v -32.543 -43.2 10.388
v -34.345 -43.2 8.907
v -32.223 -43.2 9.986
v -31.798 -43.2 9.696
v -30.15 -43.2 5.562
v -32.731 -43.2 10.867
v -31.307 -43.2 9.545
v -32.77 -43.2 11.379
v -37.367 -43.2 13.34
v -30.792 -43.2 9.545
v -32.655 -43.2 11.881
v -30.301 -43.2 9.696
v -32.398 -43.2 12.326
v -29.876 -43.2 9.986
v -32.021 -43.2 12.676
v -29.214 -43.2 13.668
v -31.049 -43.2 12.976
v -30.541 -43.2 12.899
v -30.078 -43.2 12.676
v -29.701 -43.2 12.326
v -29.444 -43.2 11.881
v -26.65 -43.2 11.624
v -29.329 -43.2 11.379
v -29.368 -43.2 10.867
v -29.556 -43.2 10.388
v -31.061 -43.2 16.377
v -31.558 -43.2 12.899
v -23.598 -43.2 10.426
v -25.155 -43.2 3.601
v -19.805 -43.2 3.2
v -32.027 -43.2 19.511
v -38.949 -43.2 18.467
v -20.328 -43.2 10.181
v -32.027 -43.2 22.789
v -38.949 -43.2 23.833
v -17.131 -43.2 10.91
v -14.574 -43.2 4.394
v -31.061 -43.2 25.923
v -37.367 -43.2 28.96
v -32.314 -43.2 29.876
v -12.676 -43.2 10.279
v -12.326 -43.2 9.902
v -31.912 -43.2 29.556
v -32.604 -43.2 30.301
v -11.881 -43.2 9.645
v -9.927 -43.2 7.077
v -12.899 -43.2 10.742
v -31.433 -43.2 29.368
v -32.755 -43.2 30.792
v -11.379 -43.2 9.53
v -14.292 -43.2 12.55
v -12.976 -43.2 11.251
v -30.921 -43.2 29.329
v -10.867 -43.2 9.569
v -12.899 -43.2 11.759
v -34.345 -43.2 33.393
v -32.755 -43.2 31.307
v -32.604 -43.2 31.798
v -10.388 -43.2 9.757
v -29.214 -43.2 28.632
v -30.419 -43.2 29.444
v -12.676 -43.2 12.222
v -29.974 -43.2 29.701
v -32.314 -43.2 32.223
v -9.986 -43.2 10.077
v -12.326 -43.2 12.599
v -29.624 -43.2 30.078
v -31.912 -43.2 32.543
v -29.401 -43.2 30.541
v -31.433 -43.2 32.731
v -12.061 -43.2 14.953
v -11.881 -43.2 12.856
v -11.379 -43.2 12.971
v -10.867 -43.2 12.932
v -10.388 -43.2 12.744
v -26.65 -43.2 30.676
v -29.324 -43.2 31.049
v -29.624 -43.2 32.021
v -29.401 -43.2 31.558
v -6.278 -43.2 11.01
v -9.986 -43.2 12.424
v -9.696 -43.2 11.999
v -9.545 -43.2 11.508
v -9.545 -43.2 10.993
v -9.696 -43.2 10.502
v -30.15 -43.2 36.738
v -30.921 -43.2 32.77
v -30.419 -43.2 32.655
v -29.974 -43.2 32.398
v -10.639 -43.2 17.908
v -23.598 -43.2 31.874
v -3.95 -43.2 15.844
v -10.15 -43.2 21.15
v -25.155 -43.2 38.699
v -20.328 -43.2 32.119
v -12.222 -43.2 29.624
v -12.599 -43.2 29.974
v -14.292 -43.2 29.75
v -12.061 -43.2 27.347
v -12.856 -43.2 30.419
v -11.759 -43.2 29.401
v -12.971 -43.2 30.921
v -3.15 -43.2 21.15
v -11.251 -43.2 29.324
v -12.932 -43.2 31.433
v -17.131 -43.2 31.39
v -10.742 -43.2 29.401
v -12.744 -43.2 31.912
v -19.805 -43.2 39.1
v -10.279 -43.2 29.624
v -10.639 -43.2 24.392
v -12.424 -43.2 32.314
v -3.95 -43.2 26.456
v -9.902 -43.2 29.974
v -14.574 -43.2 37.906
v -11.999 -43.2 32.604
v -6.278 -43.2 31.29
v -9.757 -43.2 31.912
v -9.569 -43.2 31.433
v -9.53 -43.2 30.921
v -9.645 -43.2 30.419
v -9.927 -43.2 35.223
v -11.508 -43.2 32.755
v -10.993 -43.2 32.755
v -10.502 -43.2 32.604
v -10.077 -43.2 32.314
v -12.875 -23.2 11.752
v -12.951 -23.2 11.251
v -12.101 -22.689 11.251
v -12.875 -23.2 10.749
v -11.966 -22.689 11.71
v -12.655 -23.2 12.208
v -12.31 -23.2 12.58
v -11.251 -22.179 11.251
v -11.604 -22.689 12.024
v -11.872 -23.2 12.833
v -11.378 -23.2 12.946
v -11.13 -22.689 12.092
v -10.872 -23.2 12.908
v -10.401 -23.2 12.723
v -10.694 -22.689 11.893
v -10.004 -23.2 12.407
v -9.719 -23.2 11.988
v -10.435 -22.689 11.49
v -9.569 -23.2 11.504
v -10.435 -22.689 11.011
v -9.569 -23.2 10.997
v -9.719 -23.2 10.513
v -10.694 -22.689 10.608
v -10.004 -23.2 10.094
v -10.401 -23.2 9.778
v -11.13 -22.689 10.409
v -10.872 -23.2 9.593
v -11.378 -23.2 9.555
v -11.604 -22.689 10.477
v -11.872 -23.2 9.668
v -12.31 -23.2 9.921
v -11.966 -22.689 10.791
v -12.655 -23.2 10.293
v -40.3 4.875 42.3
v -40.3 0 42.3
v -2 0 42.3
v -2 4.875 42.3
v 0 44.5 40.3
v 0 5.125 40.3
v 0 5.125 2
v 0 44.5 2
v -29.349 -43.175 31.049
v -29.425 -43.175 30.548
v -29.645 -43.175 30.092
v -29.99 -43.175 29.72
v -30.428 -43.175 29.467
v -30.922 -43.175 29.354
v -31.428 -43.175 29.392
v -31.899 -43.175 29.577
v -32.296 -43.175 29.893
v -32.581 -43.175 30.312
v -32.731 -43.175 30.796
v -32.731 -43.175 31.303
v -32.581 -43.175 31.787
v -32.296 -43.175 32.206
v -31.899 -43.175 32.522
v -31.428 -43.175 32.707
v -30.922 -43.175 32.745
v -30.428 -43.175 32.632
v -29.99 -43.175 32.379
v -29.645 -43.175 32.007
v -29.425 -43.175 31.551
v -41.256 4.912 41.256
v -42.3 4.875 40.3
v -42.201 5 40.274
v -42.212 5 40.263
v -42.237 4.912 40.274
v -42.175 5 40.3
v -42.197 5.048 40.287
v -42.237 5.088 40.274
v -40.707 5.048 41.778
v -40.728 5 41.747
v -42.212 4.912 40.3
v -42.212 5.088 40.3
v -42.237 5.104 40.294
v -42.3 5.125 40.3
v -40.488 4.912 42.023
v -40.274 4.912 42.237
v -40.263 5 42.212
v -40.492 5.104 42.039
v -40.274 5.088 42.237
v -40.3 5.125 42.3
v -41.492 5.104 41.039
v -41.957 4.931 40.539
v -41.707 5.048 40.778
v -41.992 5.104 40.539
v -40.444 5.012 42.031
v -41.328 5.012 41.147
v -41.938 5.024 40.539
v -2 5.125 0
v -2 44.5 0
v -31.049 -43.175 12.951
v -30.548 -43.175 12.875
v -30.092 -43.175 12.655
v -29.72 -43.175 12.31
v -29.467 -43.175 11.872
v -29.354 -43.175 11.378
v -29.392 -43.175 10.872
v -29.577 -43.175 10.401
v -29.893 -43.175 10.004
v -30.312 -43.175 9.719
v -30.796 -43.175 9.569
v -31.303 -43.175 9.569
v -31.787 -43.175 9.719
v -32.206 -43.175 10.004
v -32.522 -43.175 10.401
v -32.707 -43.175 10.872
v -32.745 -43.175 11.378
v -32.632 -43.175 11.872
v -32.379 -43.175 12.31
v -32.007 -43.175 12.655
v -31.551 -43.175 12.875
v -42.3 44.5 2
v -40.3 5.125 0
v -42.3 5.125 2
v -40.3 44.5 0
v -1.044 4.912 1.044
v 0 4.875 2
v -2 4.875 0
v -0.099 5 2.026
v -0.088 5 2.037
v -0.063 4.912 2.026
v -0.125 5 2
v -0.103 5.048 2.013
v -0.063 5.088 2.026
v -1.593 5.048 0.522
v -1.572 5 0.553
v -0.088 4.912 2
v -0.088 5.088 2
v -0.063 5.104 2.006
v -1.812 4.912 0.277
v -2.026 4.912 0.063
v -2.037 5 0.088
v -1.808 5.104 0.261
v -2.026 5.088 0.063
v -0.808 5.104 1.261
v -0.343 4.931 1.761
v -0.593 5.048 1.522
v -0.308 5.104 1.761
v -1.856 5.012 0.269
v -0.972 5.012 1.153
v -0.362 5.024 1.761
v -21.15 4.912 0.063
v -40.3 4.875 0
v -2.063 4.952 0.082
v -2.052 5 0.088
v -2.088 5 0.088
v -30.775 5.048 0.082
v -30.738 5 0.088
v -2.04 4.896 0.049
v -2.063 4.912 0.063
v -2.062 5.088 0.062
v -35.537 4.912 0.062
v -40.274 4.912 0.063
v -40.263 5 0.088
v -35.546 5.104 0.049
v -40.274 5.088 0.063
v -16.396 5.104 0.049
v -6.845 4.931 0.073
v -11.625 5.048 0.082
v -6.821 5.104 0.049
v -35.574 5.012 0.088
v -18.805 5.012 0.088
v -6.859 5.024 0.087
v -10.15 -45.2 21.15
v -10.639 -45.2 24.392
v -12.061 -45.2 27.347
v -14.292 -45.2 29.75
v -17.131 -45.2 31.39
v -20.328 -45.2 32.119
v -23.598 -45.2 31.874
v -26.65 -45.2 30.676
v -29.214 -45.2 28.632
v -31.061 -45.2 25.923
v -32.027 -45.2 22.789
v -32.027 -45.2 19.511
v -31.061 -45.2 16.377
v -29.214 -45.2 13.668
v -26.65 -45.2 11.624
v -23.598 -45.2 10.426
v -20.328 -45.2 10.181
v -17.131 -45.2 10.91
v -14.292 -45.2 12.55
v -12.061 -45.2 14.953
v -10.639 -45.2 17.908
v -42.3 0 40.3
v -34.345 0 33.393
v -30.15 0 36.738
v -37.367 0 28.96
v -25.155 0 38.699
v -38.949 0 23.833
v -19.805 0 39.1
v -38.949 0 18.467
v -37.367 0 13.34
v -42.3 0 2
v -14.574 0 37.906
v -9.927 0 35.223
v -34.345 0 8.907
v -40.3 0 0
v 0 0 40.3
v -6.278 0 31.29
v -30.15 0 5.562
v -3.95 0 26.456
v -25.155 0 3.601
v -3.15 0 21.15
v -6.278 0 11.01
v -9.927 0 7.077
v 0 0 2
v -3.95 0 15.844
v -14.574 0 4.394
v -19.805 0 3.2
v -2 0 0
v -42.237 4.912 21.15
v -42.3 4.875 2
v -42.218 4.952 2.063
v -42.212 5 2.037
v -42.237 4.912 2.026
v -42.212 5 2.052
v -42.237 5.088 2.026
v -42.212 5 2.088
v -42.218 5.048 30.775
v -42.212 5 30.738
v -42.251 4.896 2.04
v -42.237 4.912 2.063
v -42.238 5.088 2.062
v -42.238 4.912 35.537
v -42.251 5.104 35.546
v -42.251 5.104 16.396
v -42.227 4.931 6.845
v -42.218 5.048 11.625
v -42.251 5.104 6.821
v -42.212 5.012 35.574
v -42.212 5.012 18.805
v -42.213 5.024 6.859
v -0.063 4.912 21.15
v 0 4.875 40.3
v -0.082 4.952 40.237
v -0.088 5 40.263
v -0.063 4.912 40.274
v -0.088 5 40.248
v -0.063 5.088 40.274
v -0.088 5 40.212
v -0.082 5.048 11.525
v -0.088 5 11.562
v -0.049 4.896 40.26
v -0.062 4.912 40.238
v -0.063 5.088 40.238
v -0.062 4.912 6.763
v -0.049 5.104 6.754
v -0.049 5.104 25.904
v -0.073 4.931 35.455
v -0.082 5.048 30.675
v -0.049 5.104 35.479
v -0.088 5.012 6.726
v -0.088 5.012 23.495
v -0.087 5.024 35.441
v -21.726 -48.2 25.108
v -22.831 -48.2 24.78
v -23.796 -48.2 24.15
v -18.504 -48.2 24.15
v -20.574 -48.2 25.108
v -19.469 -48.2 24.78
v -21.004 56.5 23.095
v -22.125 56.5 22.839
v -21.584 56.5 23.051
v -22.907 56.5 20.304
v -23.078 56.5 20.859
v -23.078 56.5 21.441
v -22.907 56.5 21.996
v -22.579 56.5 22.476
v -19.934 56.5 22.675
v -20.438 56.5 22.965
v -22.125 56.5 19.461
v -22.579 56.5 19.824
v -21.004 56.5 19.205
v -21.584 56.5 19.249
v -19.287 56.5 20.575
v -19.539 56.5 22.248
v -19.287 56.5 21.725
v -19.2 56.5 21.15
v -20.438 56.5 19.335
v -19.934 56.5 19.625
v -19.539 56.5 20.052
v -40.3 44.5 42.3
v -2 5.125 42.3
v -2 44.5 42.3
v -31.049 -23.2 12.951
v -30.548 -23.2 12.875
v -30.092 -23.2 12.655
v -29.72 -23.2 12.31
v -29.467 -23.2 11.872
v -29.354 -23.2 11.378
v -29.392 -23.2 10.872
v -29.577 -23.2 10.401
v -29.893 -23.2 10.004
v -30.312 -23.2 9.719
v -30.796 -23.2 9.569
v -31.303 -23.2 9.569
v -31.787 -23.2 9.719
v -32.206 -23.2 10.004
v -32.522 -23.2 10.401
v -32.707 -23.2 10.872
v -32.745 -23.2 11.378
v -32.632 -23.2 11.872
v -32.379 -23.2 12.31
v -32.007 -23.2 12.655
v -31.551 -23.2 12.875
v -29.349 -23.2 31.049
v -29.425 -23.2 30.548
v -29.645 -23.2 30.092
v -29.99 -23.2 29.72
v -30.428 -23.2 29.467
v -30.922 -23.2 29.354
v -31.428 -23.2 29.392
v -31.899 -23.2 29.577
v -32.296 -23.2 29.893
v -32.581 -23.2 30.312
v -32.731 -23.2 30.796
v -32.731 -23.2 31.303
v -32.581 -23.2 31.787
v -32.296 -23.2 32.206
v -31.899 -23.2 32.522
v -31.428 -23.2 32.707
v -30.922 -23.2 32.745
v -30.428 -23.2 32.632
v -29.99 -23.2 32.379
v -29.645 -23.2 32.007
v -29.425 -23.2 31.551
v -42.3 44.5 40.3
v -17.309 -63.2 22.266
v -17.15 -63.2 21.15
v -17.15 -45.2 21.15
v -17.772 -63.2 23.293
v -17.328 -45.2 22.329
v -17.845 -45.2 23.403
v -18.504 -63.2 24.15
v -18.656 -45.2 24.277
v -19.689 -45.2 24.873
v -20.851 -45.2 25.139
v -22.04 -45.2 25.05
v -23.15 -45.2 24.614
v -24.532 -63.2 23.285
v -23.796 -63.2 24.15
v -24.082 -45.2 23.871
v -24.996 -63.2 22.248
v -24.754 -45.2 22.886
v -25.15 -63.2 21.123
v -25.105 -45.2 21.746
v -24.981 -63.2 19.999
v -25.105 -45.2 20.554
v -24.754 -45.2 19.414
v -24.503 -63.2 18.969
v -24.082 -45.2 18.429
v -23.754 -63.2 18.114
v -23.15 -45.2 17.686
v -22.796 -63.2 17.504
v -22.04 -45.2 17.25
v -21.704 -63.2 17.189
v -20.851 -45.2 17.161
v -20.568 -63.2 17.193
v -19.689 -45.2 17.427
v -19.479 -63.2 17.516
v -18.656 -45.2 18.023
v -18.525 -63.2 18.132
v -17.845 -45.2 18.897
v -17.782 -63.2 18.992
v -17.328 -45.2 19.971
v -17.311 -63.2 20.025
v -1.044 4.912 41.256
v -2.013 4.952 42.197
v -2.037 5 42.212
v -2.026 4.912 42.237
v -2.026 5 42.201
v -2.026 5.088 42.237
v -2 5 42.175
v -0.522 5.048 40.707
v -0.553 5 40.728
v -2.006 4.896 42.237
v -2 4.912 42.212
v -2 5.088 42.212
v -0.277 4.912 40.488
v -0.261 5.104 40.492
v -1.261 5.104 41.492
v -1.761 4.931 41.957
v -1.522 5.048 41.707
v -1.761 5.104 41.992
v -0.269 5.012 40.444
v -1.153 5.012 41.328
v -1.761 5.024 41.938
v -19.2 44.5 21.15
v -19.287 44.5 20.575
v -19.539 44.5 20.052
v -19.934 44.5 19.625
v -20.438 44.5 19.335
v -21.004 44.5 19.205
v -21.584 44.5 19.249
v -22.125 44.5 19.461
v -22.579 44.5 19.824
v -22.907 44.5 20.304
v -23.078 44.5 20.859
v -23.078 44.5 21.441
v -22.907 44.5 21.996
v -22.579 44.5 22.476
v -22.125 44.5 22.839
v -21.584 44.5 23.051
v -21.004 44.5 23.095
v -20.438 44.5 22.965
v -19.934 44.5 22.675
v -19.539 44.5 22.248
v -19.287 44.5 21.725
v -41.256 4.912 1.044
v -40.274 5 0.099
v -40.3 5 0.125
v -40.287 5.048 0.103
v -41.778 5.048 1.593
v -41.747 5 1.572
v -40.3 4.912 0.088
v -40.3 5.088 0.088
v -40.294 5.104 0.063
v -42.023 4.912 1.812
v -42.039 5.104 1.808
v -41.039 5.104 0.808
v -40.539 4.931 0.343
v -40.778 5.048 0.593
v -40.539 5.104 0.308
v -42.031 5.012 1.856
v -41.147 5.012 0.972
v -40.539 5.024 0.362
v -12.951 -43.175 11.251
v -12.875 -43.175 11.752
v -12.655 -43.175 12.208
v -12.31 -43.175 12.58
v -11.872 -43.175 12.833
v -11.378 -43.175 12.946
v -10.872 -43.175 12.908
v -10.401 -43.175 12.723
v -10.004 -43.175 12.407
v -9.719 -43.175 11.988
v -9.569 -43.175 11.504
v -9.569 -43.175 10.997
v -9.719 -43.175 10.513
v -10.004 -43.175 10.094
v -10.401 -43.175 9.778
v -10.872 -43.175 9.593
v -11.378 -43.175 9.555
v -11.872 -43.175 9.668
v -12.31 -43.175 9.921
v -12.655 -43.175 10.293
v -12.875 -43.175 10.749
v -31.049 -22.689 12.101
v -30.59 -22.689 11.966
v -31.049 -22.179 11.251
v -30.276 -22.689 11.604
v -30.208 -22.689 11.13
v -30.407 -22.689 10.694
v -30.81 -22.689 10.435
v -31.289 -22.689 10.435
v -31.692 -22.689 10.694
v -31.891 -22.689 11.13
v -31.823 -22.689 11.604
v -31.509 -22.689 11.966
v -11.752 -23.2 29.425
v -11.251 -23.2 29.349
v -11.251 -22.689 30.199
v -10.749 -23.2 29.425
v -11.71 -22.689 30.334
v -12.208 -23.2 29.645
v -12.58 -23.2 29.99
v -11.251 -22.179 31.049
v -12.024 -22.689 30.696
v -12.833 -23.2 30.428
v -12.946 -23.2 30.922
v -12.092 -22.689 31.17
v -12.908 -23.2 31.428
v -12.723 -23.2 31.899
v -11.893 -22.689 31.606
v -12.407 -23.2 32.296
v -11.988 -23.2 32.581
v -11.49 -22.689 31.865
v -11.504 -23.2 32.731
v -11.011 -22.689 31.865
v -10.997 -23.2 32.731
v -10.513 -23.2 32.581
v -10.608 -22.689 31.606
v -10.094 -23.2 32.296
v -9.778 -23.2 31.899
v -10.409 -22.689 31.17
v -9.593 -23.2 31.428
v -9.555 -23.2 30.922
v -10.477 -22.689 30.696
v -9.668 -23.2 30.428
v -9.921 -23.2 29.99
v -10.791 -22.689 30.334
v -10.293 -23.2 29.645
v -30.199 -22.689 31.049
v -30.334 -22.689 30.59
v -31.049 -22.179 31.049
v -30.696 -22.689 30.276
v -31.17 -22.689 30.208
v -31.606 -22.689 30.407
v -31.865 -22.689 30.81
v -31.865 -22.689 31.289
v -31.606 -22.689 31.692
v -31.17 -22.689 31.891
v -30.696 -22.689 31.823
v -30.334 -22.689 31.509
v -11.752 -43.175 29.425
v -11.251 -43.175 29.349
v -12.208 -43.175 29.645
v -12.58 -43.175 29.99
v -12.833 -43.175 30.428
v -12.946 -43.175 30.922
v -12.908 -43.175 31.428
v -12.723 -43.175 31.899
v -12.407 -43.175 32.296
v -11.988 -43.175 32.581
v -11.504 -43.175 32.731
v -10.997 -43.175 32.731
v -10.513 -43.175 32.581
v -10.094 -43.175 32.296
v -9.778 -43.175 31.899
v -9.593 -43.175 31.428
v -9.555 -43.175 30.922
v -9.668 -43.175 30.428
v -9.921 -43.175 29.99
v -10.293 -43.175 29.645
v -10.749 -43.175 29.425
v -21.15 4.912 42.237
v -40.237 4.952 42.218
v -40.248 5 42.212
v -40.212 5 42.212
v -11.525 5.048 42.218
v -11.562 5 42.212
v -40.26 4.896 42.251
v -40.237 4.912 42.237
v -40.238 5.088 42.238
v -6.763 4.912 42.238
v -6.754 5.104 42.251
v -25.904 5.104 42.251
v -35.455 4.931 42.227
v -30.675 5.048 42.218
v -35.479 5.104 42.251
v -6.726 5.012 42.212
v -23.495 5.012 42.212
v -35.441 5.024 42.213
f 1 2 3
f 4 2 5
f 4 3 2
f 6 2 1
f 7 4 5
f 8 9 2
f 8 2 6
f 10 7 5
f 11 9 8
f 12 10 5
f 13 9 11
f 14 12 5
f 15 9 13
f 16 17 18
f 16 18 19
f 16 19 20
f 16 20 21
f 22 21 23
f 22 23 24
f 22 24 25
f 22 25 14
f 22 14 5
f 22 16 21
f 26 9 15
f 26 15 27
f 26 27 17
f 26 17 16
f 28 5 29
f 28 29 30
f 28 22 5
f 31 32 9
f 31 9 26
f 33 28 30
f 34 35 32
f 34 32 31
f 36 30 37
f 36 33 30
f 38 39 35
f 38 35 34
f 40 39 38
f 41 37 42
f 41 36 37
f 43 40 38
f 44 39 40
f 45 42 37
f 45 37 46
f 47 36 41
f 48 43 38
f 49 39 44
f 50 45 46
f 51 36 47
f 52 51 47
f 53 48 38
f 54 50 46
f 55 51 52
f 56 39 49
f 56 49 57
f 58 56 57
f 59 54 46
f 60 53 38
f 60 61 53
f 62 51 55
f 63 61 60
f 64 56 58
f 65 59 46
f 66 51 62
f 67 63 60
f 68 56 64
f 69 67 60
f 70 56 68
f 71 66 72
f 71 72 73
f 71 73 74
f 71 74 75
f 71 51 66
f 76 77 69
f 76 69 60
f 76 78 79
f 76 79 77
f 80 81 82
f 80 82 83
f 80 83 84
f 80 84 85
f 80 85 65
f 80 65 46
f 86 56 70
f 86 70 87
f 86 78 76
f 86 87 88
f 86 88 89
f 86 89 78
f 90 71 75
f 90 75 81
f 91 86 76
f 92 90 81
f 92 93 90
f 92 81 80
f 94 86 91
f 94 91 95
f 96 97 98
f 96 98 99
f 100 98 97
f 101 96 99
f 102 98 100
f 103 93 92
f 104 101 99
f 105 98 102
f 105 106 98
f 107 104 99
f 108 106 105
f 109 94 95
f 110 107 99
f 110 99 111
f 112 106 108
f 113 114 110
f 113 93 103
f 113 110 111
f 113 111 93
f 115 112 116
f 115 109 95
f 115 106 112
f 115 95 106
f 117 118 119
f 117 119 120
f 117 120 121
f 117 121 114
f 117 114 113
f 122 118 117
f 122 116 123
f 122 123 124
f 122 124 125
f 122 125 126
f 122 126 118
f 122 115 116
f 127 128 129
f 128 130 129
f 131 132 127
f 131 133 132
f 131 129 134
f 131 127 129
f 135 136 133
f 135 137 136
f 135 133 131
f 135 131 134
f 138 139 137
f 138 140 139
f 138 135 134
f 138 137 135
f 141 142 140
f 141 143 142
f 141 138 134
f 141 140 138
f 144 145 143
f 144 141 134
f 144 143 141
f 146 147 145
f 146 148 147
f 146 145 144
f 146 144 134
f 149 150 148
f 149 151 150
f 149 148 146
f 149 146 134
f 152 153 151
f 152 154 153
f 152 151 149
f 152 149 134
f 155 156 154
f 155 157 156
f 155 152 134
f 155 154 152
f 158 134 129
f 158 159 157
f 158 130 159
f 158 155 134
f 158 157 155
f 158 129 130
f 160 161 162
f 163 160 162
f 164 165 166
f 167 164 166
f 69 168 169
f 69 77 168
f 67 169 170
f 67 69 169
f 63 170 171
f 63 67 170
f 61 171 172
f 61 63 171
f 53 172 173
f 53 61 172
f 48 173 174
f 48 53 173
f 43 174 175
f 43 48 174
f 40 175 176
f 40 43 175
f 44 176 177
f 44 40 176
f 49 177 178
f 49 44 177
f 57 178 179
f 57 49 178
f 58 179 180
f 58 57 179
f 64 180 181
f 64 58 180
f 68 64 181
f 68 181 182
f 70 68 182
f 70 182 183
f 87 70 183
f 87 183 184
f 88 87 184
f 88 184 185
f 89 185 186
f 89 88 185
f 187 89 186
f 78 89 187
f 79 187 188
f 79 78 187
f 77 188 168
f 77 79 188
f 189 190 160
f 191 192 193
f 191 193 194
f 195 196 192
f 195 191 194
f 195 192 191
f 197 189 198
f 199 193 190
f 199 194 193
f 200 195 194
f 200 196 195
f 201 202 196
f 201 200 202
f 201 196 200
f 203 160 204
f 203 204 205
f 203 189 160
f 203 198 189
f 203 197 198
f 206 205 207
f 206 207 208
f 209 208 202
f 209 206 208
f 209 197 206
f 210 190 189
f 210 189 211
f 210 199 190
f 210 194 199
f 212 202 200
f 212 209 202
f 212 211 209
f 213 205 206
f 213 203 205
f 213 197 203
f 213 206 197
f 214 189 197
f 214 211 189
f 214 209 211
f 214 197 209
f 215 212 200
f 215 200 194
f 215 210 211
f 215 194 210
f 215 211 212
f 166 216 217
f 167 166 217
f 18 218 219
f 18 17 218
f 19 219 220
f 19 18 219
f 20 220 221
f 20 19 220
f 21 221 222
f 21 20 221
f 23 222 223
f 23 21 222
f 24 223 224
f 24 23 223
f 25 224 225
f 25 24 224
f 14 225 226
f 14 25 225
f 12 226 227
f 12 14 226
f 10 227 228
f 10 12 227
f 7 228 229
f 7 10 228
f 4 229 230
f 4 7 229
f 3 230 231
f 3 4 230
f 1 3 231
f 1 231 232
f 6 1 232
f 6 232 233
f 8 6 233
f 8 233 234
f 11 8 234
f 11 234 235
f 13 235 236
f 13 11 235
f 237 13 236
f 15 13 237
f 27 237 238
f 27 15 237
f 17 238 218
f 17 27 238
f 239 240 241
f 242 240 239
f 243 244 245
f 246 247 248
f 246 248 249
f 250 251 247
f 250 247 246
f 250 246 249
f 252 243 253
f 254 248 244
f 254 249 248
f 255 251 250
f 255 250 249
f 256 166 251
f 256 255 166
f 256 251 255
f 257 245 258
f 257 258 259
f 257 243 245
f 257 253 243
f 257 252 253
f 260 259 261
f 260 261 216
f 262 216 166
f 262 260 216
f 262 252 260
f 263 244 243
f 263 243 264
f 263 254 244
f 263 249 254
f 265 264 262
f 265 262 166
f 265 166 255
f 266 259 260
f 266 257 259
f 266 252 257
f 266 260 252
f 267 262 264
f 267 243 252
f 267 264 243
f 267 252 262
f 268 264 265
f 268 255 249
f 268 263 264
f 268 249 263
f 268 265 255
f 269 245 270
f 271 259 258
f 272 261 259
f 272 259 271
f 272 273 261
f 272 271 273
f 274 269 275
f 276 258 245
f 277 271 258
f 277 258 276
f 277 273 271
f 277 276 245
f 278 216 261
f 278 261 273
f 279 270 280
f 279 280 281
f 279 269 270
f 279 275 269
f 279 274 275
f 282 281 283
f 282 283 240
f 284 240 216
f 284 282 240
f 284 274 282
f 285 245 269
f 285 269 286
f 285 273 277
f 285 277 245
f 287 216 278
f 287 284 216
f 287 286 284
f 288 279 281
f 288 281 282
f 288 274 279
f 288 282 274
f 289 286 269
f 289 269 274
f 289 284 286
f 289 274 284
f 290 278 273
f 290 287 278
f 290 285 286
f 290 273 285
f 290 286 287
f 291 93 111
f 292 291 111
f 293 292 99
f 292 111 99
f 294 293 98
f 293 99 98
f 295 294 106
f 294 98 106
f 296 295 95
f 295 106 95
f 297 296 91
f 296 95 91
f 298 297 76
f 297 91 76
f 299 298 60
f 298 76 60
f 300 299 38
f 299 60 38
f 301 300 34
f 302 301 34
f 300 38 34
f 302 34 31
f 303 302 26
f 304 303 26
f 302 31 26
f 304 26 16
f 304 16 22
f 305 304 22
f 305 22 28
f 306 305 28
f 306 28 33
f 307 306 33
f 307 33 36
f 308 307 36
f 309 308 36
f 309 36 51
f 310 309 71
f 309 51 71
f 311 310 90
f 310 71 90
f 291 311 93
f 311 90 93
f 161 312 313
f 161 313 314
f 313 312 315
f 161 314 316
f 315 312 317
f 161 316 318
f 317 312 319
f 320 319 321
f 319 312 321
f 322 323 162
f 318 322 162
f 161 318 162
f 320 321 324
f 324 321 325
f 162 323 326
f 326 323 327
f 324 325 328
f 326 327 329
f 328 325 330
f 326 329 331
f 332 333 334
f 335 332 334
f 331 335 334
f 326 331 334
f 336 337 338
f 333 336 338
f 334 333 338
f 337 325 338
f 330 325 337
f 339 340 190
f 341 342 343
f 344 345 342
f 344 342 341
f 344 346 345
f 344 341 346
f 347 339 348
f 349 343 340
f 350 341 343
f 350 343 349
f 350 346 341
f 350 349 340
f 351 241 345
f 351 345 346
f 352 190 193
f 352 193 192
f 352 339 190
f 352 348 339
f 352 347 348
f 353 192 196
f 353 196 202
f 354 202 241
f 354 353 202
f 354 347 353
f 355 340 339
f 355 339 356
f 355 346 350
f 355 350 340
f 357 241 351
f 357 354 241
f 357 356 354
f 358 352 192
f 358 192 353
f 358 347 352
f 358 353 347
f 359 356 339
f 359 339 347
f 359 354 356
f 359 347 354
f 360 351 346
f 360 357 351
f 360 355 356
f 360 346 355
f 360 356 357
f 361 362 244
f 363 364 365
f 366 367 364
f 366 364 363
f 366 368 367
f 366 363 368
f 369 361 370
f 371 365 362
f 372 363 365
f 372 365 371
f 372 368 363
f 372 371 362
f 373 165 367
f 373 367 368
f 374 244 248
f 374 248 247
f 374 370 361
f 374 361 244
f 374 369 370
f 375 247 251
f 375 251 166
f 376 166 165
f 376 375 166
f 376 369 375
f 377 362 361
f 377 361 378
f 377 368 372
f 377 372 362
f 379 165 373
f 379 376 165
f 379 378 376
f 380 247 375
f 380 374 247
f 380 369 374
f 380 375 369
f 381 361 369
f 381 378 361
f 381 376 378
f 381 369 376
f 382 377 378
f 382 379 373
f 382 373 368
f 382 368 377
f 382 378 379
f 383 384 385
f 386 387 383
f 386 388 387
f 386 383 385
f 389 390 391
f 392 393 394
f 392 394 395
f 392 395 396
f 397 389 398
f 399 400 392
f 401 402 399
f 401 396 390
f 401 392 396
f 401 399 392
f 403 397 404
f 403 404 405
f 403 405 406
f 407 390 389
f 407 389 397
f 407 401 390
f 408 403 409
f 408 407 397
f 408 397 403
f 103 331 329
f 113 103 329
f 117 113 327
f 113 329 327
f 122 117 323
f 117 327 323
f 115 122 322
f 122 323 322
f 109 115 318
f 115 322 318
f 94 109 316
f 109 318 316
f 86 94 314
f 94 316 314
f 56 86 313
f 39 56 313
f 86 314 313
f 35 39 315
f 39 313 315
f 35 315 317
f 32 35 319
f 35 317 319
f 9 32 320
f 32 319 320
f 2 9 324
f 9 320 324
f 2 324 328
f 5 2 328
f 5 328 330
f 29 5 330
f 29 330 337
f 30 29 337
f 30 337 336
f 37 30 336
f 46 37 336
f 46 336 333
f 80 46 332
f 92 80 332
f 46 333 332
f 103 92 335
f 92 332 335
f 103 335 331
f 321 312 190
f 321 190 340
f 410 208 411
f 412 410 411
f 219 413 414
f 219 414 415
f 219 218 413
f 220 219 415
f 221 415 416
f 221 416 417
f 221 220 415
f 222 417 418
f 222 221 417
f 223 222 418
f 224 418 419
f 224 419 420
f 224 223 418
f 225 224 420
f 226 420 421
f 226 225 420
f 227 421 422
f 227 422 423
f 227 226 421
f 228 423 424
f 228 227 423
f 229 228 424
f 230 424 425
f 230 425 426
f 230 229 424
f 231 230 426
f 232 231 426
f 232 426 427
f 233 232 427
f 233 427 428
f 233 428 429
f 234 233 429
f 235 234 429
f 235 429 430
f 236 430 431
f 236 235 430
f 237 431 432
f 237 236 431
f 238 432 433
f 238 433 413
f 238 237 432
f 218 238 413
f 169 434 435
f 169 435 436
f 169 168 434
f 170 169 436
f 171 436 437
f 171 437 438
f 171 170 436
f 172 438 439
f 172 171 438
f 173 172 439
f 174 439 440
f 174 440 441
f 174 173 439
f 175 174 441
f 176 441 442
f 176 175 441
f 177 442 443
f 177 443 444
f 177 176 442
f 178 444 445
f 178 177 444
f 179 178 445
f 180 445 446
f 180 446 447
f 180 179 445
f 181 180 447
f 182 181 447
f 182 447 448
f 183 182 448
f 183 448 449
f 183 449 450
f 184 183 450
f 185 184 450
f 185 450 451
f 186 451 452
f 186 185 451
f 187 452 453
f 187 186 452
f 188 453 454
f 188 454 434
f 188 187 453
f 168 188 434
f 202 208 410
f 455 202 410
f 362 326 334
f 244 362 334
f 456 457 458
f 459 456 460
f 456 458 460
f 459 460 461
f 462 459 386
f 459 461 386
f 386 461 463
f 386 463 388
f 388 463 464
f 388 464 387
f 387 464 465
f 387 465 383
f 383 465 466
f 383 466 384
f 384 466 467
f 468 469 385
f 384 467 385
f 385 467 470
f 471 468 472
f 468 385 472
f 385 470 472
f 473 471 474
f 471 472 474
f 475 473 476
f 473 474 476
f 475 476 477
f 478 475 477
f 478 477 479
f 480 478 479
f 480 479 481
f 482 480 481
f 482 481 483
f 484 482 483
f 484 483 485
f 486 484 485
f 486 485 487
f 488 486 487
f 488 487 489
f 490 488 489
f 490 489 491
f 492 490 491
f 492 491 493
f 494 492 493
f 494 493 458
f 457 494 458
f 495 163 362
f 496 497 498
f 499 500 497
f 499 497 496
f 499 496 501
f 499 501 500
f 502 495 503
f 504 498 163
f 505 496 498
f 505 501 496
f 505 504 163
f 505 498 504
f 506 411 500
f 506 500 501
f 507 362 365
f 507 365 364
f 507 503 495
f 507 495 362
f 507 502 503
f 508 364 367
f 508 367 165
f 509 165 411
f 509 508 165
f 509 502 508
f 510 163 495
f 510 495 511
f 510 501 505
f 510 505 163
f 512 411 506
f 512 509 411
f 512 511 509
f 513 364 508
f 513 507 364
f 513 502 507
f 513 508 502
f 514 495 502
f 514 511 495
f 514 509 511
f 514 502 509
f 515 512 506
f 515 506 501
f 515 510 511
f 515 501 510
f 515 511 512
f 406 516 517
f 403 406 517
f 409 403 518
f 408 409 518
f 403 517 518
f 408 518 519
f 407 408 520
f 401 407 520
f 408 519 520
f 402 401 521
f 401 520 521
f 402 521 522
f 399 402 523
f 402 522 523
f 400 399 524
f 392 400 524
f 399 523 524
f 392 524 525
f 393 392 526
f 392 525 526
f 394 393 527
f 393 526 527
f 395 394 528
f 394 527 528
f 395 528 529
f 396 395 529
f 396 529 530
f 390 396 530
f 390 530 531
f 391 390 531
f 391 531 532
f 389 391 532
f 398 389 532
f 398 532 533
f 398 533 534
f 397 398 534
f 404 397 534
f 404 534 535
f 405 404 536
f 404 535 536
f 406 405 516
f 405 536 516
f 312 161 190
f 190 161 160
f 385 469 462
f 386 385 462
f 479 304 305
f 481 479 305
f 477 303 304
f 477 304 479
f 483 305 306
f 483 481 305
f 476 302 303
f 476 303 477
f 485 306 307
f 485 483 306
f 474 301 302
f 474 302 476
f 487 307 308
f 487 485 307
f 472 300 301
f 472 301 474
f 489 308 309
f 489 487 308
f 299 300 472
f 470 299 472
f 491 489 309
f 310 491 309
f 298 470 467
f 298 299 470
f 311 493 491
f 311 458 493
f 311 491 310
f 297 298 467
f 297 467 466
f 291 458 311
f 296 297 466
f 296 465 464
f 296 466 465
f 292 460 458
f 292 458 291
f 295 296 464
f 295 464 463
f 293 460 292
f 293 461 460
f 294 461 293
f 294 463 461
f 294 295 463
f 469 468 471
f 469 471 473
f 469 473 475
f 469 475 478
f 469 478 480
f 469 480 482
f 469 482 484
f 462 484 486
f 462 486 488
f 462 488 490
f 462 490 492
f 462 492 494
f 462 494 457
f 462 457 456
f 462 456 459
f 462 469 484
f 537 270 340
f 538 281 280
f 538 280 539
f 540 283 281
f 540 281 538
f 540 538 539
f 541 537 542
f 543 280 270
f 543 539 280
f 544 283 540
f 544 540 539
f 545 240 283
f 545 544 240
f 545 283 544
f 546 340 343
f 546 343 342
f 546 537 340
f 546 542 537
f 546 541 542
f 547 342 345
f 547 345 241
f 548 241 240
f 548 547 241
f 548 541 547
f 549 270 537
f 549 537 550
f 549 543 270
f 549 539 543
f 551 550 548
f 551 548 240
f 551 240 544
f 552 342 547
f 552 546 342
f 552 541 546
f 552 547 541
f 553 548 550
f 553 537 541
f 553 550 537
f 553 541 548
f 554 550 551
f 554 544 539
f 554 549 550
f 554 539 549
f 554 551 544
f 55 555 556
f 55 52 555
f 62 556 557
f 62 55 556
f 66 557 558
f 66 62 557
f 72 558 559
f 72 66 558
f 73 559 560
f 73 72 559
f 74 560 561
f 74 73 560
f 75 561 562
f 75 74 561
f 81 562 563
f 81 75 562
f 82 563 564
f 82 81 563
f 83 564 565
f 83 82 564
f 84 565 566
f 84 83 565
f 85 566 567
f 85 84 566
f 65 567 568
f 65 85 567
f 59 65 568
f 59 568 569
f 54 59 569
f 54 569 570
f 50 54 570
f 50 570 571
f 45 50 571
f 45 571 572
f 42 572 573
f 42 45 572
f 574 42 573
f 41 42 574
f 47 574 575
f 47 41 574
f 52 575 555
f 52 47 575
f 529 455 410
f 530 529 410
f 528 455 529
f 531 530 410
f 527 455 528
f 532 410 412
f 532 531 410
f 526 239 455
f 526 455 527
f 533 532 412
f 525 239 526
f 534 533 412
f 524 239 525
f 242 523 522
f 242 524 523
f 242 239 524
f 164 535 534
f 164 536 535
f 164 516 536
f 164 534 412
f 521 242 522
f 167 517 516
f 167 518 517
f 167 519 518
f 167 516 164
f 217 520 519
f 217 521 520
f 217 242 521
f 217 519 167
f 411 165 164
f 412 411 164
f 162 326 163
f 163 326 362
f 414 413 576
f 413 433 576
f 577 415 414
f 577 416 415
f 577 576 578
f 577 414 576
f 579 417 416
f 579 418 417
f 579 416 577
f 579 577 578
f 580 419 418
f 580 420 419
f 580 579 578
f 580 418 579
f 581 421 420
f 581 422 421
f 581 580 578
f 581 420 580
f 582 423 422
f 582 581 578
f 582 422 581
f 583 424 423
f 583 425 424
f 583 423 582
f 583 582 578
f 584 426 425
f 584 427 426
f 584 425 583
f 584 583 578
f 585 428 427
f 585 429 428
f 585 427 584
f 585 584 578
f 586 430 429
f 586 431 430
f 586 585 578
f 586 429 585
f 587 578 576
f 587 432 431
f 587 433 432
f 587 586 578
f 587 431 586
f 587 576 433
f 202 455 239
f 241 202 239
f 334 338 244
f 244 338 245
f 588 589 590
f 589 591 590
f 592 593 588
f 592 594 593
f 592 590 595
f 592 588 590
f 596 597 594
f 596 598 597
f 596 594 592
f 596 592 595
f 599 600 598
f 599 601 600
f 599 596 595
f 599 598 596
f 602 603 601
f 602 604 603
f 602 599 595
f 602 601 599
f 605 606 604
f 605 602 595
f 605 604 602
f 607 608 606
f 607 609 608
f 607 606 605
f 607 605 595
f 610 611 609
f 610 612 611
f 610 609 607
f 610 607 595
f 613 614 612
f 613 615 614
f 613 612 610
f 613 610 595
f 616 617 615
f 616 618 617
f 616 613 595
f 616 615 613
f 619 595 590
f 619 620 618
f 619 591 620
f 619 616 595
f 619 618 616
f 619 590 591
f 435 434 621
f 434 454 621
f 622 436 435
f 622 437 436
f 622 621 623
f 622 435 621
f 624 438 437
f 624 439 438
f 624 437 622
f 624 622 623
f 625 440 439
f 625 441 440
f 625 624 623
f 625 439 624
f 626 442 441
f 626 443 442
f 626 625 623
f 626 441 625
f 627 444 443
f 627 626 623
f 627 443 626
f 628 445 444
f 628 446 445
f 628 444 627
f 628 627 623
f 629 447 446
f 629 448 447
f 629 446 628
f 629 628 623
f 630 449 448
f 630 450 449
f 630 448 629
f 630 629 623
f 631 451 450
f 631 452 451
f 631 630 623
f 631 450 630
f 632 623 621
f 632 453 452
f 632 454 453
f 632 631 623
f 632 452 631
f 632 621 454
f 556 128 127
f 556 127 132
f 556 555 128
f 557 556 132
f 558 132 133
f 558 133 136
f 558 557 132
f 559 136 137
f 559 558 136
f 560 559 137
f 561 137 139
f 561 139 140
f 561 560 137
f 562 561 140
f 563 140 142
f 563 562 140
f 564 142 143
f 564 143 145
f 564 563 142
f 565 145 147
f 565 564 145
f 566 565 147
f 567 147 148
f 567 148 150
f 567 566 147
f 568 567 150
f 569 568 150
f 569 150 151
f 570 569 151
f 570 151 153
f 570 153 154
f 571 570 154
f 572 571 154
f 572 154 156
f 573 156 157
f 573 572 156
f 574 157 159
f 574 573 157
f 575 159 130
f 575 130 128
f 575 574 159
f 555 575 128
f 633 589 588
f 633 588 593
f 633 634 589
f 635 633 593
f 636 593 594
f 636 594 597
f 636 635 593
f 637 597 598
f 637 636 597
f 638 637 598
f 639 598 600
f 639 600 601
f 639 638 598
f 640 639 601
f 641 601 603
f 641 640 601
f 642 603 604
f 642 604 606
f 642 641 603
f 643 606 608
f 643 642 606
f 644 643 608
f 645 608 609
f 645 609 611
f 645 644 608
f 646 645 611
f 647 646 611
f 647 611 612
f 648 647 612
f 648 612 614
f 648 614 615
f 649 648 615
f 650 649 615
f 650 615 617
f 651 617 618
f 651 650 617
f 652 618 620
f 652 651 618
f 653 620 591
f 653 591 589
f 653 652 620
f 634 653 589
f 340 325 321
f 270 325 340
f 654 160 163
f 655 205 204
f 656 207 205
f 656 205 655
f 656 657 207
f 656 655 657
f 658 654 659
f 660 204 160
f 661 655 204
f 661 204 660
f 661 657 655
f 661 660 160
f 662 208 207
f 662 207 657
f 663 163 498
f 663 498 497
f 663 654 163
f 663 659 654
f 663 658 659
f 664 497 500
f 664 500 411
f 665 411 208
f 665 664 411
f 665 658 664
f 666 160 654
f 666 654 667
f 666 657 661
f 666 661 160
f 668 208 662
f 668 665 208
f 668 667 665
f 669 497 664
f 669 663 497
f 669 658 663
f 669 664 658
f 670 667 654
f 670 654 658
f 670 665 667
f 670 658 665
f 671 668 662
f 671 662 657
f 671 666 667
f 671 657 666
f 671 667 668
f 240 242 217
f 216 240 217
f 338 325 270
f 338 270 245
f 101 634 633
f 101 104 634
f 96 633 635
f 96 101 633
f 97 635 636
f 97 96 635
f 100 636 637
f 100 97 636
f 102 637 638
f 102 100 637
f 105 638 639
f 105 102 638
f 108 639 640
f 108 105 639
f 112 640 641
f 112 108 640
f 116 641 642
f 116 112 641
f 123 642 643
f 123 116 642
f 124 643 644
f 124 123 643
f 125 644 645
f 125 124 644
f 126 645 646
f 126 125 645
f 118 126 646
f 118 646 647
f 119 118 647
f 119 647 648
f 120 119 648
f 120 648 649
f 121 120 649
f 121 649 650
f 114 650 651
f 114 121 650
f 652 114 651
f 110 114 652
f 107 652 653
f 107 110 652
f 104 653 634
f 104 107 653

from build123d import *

# Parameters (mm, degrees)
SKETCH1_W           = 42.3
SKETCH1_H           = 42.3
BOSS_EXTRUDE1_DEPTH = 44.5
CHAMFER1_SIZE       = 2
SKETCH3_R           = 1.95
BOSS_EXTRUDE2_DEPTH = 12
SKETCH4_R           = 18
BOSS_EXTRUDE3_DEPTH = 43.2
SKETCH6_R           = 0.125
SKETCH7_R           = 11
BOSS_EXTRUDE4_DEPTH = 2
SKETCH9_R           = 4
BOSS_EXTRUDE5_DEPTH = 18
SKETCH10_W          = 5.291502622
SKETCH10_H          = 3
CUT_EXTRUDE1_DEPTH  = 15
CIRPATTERN1_COUNT   = 4


with BuildPart() as part:
    # Sketch1 → Boss-Extrude1 (new body)
    with BuildSketch(Plane(origin=(0, 0, 0), x_dir=(1, 0, 0), z_dir=(0, 1, 0))):
        with Locations((-21.15, -21.15)):
            Rectangle(SKETCH1_W, SKETCH1_H)
    extrude(amount=BOSS_EXTRUDE1_DEPTH)

    # Chamfer1
    chamfer1_edges = [part.edges().sort_by_distance(p)[0] for p in [
        (0, 22.25, 42.3),
        (-42.3, 22.25, 42.3),
        (-42.3, 22.25, 0),
        (0, 22.25, 0),
    ]]
    chamfer(chamfer1_edges, length=CHAMFER1_SIZE)

    # Sketch3 → Boss-Extrude2 (add)
    with BuildSketch(Plane(origin=(0, 44.5, 0), x_dir=(1, 0, 0), z_dir=(0, 1, 0))):
        with Locations((-21.15, -21.15)):
            Circle(SKETCH3_R)
    extrude(amount=BOSS_EXTRUDE2_DEPTH)

    # Sketch4 → Boss-Extrude3 (add)
    with BuildSketch(Plane.XZ):
        with Locations((-21.15, 21.15)):
            Circle(SKETCH4_R)
    extrude(amount=BOSS_EXTRUDE3_DEPTH)

    # Cut-Sweep2: sweep along a path in Sketch5
    with BuildLine(Plane(origin=(0, 5, 0), x_dir=(-1, 0, 0), z_dir=(0, -1, 0))) as cut_sweep2_path:
        Line((2, 0), (0, -2))
        Line((0, -2), (0, -40.3))
        Line((0, -40.3), (2, -42.3))
        Line((2, -42.3), (40.3, -42.3))
        Line((40.3, -42.3), (42.3, -40.3))
        Line((42.3, -40.3), (42.3, -2))
        Line((42.3, -2), (40.3, 0))
        Line((40.3, 0), (2, 0))
    # Sketch6 → Cut-Sweep2 (sweep, cut)
    with BuildSketch(Plane(origin=(0, 0, 0), x_dir=(0, 0, -1), z_dir=(1, 0, 0))):
        with Locations((-40.3, 5)):
            Circle(SKETCH6_R)
    sweep(path=cut_sweep2_path.line, transition=Transition.RIGHT, mode=Mode.SUBTRACT)

    # Sketch7 → Boss-Extrude4 (add)
    with BuildSketch(Plane.XZ.offset(43.2)):
        with Locations((-21.15, 21.15)):
            Circle(SKETCH7_R)
    extrude(amount=BOSS_EXTRUDE4_DEPTH)

    # Sketch9 → Boss-Extrude5 (add)
    with BuildSketch(Plane.XZ.offset(45.2)):
        with Locations((-21.15, 21.15)):
            Circle(SKETCH9_R)
    extrude(amount=BOSS_EXTRUDE5_DEPTH)

    # Sketch10 → Cut-Extrude1 (cut)
    with BuildSketch(Plane.XZ.offset(63.2)):
        with Locations((-21.15, 25.65)):
            Rectangle(SKETCH10_W, SKETCH10_H)
    extrude(amount=-CUT_EXTRUDE1_DEPTH, mode=Mode.SUBTRACT)

    # Sketch13 → M3 Clearance Hole1 (revolve, cut)
    with BuildSketch(Plane(origin=(-11.250505063, -43.2, 31.049494937), x_dir=(0, 0, -1), z_dir=(1, 0, 0))):
        Polygon((0, 0), (0, 21.021463052), (1.7, 20), (1.7, 0.025), (1.725, 0), align=None)
    m3_clearance_hole1 = revolve(axis=Axis((-11.250505063, -49.55, 31.049494937), (0, 1, 0)), mode=Mode.SUBTRACT)

    # CirPattern1: M3 Clearance Hole1 ×4 about axis
    cirpattern1_axis = Axis((-21.15, 0, 21.15), (0, 1, 0))
    for i in range(1, CIRPATTERN1_COUNT):
        add(m3_clearance_hole1.rotate(cirpattern1_axis, i * 360 / CIRPATTERN1_COUNT), mode=Mode.SUBTRACT)


solid = part.part
